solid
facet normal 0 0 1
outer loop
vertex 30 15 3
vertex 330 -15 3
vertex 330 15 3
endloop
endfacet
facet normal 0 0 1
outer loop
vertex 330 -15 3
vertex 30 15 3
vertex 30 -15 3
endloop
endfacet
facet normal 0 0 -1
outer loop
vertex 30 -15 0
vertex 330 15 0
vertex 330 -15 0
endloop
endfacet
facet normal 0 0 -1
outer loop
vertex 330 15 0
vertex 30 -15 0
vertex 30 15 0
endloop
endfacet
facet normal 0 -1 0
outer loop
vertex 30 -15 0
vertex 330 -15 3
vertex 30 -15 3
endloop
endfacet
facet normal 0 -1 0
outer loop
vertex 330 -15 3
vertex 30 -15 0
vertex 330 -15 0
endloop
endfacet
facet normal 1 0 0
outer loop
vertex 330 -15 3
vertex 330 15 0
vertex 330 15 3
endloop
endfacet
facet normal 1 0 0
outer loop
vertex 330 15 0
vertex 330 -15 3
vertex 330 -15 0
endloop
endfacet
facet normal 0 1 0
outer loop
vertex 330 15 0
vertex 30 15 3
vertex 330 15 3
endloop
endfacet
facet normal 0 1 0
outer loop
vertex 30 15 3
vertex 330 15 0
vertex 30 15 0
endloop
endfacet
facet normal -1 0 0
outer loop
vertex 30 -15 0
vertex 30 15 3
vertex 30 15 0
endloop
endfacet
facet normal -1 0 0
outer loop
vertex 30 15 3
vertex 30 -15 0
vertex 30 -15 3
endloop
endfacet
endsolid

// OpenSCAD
// file: settings.scad
/* BandMate Project, settings.scad
 * settings.scad by Oskari Rundgren is licensed under the
 * Creative Commons Attribution-ShareAlike 4.0 International License.
 */

bar_width = 30;
bar_height = 3;
bar_length = 300; 
// main file
/* BandMate Project, other_parts.scad
 * other_parts.scad by Oskari Rundgren is licensed under the
 * Creative Commons Attribution-ShareAlike 4.0 International License.
 */

include <settings.scad>

bar();

/* Two metal rods. */
module rods(length=300)
{
	translate([0,20,0]) rotate([0,90,0]) cylinder(r=4, h=length);
	translate([0,-20,0]) rotate([0,90,0]) cylinder(r=4, h=length);
}

/* Belt. */
module belt(radius,length)
{
	difference()
	{
	hull()
	{
		translate([length,0,0]) cylinder(r=radius+2,h=5,center=true);
		translate([0,0,0]) cylinder(r=radius+2,h=5,center=true);
	}
	hull()
	{
		translate([length,0,0]) cylinder(r=radius,h=7,center=true);
		translate([0,0,0]) cylinder(r=radius,h=7,center=true);
	}
	}
}

/* Hexnut. */
module hexnut(width,height)
{
	translate([0,0,height/2]) rotate([0,0,0]) cube([width,tan(30)*width,height],center=true);
	translate([0,0,height/2]) rotate([0,0,60]) cube([width,tan(30)*width,height],center=true);
	translate([0,0,height/2]) rotate([0,0,120]) cube([width,tan(30)*width,height],center=true);

}

/* Flat metal bar under the string. */
module bar()
{
	translate([bar_length/2+30,0,bar_height/2]) cube([bar_length,bar_width,bar_height],center=true);
}

module bearing(hole_radius=8.5, radius=20,width=12)
{	
	translate([0,0,radius+3])
	rotate([90,0,0]) 
	difference()
	{
		cylinder(r=radius, h=width,center=true);
		cylinder(r=hole_radius, h=width*1.1,center=true);
	}
}
